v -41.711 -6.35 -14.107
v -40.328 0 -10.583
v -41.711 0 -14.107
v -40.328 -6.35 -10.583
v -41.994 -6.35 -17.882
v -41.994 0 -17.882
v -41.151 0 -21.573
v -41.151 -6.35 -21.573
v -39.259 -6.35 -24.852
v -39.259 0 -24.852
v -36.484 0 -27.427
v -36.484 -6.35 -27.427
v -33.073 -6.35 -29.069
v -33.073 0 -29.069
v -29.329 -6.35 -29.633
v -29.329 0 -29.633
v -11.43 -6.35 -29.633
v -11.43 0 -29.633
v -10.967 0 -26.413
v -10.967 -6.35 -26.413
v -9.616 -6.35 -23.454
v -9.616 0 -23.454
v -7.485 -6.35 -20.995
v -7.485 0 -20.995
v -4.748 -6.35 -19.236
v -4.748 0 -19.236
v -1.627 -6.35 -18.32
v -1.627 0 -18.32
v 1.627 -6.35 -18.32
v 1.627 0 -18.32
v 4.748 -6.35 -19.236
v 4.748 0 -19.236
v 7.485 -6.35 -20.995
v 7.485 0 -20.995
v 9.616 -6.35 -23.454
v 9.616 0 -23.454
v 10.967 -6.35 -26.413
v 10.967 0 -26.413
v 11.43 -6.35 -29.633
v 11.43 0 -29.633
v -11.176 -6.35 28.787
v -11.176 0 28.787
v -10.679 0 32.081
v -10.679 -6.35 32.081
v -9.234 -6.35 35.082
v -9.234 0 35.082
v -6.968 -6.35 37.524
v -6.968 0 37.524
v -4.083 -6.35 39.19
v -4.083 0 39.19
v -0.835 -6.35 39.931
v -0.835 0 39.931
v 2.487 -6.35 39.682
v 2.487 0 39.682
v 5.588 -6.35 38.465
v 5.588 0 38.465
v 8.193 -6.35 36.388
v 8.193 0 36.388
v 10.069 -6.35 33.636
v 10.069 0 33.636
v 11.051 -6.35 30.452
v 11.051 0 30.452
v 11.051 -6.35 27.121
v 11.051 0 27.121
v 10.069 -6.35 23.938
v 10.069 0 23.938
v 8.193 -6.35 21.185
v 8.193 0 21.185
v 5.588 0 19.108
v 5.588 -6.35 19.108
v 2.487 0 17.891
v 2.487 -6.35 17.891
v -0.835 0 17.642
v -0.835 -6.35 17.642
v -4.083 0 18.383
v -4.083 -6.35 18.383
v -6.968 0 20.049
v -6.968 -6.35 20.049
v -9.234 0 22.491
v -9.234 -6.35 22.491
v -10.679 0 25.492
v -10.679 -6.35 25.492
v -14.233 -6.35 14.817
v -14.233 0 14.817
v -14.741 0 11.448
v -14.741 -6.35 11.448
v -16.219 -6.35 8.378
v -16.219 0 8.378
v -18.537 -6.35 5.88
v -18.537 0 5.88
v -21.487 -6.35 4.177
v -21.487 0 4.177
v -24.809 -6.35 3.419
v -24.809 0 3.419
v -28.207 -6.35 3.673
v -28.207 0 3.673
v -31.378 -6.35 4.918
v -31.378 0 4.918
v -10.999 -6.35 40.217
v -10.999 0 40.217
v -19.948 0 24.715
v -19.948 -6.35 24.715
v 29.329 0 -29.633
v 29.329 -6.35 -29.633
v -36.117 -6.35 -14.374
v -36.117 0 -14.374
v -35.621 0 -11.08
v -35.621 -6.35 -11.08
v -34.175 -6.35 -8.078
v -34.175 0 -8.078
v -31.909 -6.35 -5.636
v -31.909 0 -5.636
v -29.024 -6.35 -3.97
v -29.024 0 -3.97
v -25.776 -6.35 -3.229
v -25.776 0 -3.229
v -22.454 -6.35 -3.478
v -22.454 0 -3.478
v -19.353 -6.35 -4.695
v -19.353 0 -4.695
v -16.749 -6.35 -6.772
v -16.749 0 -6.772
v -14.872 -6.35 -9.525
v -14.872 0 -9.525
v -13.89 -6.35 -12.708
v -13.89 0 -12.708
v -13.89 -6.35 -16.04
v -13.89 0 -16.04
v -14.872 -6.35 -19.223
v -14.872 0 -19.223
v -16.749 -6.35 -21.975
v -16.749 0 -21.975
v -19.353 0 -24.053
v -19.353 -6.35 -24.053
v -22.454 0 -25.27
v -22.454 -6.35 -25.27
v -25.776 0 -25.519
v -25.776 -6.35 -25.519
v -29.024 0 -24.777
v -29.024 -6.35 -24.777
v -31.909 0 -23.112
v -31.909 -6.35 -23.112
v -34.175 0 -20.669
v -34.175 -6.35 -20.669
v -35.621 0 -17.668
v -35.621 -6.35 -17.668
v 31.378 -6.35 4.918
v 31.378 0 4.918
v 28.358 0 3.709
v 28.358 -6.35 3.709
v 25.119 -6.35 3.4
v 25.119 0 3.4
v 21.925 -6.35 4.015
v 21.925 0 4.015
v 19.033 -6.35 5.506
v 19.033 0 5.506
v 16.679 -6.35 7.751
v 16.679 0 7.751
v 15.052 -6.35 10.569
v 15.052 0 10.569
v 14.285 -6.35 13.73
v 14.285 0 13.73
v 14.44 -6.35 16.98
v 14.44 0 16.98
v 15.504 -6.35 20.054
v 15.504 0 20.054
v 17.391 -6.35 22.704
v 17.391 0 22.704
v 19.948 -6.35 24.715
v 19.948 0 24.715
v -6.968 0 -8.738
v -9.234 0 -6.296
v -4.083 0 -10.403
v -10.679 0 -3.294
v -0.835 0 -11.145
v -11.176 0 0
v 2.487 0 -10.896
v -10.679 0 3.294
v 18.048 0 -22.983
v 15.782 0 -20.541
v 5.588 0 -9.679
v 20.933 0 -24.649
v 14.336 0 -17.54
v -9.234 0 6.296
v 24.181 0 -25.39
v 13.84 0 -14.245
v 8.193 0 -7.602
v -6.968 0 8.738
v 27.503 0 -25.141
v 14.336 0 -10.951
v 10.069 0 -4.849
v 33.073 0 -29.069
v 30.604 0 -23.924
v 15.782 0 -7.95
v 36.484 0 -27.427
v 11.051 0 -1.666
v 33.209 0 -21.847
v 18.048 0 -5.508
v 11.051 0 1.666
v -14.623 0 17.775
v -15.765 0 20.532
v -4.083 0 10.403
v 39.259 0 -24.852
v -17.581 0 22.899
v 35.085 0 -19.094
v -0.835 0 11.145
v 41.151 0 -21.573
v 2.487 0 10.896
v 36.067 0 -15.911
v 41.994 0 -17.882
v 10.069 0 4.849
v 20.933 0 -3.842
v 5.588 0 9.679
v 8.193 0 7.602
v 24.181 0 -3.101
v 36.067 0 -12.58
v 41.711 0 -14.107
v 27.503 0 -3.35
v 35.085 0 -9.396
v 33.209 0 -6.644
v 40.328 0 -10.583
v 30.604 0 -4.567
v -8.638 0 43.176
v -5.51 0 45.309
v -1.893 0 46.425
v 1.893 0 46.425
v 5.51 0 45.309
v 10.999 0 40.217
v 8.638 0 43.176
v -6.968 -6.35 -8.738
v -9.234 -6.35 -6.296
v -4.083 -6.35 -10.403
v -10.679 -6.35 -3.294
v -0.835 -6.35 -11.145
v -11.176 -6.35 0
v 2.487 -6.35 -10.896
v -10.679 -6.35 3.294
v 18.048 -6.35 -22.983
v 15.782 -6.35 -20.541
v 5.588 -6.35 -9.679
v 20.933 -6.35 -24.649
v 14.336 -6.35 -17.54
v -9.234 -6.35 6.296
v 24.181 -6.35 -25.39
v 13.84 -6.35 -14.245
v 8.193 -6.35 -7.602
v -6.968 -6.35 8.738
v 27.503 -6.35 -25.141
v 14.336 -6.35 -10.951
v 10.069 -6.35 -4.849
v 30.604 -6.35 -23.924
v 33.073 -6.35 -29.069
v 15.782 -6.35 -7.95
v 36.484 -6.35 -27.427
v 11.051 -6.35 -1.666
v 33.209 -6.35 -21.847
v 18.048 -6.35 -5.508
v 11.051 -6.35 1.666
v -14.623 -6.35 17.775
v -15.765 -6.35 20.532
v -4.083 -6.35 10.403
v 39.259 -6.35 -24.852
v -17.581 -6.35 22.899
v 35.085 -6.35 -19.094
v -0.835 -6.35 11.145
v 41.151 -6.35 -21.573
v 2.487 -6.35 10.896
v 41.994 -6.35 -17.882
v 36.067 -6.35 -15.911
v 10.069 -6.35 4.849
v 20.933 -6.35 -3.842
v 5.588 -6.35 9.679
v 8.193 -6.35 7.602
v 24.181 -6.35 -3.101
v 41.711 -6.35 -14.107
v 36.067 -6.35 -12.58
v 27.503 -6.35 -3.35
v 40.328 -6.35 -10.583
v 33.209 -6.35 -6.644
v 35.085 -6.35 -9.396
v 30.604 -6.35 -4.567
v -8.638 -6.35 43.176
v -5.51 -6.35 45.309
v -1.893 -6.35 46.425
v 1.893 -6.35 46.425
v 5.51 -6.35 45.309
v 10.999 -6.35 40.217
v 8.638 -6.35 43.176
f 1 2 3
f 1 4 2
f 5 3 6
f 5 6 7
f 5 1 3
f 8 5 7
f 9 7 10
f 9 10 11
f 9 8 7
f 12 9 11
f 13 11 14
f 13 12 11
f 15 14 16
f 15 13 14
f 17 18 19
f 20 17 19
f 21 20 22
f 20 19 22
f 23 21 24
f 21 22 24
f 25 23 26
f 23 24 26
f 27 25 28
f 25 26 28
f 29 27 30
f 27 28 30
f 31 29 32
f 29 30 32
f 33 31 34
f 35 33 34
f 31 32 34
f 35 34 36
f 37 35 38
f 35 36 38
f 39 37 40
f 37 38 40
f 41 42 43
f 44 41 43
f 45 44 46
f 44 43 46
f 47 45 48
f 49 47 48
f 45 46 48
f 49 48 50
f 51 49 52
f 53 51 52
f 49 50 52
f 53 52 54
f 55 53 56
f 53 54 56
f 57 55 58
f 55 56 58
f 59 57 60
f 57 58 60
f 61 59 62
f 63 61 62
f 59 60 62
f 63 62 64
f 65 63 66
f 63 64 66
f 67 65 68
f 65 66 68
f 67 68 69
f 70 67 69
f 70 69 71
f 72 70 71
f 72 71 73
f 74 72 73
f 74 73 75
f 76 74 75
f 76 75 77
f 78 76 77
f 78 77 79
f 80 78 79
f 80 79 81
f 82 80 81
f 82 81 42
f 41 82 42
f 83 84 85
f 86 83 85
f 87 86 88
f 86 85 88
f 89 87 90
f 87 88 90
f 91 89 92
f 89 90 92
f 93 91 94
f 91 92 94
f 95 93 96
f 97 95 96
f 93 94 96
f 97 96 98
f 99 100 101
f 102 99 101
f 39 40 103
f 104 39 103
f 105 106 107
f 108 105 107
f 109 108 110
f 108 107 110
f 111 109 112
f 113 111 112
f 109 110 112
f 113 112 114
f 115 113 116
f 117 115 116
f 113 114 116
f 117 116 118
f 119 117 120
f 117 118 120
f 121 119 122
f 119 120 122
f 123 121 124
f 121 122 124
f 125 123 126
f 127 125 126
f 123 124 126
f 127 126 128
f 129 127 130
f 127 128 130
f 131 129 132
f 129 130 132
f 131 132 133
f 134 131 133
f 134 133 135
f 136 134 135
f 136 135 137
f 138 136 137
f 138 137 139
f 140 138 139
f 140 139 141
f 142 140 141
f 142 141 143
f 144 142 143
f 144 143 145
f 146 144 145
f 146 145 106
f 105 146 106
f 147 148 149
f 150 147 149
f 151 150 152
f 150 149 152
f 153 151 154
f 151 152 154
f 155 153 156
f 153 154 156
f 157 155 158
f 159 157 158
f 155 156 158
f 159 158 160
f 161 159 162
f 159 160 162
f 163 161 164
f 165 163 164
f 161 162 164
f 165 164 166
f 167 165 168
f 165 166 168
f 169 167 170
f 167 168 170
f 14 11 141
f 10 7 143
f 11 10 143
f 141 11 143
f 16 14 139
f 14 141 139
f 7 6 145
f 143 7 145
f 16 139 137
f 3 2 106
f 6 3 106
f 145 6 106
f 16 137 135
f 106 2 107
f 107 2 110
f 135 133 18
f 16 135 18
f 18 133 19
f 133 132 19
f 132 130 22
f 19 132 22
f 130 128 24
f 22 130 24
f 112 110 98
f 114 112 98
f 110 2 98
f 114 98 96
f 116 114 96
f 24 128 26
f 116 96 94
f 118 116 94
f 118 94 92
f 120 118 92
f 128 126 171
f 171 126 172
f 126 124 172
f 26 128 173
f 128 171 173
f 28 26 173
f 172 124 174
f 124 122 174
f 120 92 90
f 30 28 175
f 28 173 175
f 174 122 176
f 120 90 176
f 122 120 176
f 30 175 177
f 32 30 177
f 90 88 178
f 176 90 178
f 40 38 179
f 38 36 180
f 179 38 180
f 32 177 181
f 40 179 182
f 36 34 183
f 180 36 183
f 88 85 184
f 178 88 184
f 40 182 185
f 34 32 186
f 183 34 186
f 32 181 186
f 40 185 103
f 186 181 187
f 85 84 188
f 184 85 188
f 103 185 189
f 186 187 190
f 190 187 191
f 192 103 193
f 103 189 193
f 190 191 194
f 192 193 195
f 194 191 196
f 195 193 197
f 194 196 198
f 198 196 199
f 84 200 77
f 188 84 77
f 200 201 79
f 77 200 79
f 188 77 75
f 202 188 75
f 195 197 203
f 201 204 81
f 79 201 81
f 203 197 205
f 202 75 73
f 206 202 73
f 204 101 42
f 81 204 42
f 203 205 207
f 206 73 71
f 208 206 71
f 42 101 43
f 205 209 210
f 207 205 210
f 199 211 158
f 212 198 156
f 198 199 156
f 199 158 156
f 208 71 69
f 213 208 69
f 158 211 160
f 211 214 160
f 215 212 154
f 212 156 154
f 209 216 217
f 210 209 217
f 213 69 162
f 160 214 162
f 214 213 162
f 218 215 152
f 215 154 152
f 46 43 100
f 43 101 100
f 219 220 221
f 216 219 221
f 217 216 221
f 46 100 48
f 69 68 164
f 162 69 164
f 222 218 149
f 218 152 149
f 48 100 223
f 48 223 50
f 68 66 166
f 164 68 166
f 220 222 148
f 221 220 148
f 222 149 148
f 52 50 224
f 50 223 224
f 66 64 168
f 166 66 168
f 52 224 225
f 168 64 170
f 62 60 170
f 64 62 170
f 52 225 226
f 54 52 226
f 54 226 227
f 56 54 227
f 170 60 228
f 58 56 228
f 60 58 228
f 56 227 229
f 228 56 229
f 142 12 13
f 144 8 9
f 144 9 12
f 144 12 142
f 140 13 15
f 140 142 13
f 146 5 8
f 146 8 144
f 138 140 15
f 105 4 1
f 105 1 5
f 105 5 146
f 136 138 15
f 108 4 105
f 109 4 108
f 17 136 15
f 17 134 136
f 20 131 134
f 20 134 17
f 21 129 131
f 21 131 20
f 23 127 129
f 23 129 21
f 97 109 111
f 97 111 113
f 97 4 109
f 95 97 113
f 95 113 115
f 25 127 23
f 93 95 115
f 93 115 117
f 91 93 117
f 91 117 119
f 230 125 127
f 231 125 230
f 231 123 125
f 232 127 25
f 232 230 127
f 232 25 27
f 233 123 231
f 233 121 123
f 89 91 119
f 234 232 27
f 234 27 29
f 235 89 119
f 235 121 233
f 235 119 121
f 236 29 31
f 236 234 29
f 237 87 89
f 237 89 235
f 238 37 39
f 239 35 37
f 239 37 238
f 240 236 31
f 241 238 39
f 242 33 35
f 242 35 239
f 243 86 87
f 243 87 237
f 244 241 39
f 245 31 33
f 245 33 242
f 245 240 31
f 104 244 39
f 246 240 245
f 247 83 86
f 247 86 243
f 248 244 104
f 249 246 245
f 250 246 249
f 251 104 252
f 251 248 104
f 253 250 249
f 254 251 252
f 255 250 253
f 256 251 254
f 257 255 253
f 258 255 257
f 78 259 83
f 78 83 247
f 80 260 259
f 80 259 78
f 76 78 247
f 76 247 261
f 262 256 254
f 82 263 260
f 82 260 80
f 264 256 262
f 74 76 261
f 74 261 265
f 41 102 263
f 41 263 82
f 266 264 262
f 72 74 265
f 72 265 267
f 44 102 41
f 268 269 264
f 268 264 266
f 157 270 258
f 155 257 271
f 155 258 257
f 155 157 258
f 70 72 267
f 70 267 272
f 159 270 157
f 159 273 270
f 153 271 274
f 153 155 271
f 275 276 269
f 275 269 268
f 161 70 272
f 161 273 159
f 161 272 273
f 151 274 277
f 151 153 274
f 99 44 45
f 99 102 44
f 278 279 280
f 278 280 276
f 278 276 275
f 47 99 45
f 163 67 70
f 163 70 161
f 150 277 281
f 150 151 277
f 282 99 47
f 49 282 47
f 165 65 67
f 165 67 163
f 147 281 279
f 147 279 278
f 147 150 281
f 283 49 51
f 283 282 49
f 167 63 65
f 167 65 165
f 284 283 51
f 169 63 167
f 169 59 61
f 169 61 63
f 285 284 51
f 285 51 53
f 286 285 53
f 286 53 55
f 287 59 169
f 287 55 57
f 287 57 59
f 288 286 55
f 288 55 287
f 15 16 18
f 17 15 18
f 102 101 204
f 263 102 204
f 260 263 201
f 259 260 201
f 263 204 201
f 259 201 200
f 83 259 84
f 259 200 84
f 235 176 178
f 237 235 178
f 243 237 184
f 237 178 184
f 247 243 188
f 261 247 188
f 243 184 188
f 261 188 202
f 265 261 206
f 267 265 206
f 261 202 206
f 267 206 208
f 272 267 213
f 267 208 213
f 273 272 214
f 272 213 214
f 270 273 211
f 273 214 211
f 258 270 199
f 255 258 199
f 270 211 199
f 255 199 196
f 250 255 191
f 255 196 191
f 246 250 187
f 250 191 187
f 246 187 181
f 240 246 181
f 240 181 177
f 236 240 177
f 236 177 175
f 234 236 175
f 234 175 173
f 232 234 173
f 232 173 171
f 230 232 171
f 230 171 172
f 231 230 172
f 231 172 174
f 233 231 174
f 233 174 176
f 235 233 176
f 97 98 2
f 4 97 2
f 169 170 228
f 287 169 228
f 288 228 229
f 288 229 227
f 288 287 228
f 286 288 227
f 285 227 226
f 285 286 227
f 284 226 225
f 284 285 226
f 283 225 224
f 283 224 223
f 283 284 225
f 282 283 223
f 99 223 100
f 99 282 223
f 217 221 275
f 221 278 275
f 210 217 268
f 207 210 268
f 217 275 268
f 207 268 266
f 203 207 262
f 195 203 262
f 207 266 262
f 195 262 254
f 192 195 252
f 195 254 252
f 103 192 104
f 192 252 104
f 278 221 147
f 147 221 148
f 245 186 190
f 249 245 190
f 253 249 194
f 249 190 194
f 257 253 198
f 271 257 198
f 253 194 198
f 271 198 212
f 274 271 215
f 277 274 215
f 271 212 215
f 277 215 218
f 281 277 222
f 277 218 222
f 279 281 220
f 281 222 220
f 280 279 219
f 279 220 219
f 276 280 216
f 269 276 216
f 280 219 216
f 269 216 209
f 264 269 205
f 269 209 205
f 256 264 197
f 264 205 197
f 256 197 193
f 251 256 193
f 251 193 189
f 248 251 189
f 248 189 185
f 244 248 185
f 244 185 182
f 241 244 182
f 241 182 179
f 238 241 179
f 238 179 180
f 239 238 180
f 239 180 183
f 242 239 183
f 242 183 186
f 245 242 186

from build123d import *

# Parameters (mm, degrees)
F1_DEPTH = 6.35
F4_R     = 11.176
F5_DEPTH = 25.4
F6_R     = 12.7
F7_R     = 11.176
F8_DEPTH = 25.4


# Not quite as in the source:
# - a feature of the source that left no trace in its solid (it failed there, or was rolled back) is left out


with BuildPart() as f1:
    # F0 (on Front) → F1 (new body)
    with BuildSketch(Plane.XZ):
        with BuildLine():
            Line((19.9482194655, 24.7153370319), (0, 59.2666666667))
            Line((0, 59.2666666667), (-19.9482194655, 24.7153370319))
            ThreePointArc((-19.9482194655, 24.7153370319), (-15.7645491002, 20.5316666667), (-14.2332194655, 14.8166666667))
            ThreePointArc((-14.2332194655, 14.8166666667), (-19.9482194655, 4.9179963014), (-31.3782194655, 4.9179963014))
            Line((-31.3782194655, 4.9179963014), (-51.326438931, -29.6333333333))
            Line((-51.326438931, -29.6333333333), (-11.43, -29.6333333333))
            ThreePointArc((-11.43, -29.6333333333), (0, -18.2033333333), (11.43, -29.6333333333))
            Line((11.43, -29.6333333333), (51.326438931, -29.6333333333))
            Line((51.326438931, -29.6333333333), (31.3782194655, 4.9179963014))
            ThreePointArc((31.3782194655, 4.9179963014), (15.7645491002, 9.1016666667), (19.9482194655, 24.7153370319))
        make_face()
    extrude(amount=F1_DEPTH)

    # F4 (on face) → F5 (cut)
    with BuildSketch(Plane(origin=(0, 0, 0), x_dir=(-1, 0, 0), z_dir=(0, 1, 0))):
        with Locations((0, 28.7866666667)):
            Circle(F4_R)
        with Locations((-25.0159751206, -14.245354451)):
            Circle(F4_R)
        with Locations((24.9412614338, -14.3738179923)):
            Circle(F4_R)
    extrude(amount=-F5_DEPTH, mode=Mode.SUBTRACT)

    # F6
    f6_edges = [f1.edges().sort_by_distance(p)[0] for p in [
        (0, -3.175, 59.266667),
        (51.326439, -3.175, -29.633333),
        (-51.326439, -3.175, -29.633333),
    ]]
    fillet(f6_edges, radius=F6_R)

    # F7 (on face) → F8 (cut)
    with BuildSketch(Plane(origin=(0, 0, 0), x_dir=(-1, 0, 0), z_dir=(0, 1, 0))):
        Circle(F7_R)
    extrude(amount=-F8_DEPTH, mode=Mode.SUBTRACT)


solid = f1.part
